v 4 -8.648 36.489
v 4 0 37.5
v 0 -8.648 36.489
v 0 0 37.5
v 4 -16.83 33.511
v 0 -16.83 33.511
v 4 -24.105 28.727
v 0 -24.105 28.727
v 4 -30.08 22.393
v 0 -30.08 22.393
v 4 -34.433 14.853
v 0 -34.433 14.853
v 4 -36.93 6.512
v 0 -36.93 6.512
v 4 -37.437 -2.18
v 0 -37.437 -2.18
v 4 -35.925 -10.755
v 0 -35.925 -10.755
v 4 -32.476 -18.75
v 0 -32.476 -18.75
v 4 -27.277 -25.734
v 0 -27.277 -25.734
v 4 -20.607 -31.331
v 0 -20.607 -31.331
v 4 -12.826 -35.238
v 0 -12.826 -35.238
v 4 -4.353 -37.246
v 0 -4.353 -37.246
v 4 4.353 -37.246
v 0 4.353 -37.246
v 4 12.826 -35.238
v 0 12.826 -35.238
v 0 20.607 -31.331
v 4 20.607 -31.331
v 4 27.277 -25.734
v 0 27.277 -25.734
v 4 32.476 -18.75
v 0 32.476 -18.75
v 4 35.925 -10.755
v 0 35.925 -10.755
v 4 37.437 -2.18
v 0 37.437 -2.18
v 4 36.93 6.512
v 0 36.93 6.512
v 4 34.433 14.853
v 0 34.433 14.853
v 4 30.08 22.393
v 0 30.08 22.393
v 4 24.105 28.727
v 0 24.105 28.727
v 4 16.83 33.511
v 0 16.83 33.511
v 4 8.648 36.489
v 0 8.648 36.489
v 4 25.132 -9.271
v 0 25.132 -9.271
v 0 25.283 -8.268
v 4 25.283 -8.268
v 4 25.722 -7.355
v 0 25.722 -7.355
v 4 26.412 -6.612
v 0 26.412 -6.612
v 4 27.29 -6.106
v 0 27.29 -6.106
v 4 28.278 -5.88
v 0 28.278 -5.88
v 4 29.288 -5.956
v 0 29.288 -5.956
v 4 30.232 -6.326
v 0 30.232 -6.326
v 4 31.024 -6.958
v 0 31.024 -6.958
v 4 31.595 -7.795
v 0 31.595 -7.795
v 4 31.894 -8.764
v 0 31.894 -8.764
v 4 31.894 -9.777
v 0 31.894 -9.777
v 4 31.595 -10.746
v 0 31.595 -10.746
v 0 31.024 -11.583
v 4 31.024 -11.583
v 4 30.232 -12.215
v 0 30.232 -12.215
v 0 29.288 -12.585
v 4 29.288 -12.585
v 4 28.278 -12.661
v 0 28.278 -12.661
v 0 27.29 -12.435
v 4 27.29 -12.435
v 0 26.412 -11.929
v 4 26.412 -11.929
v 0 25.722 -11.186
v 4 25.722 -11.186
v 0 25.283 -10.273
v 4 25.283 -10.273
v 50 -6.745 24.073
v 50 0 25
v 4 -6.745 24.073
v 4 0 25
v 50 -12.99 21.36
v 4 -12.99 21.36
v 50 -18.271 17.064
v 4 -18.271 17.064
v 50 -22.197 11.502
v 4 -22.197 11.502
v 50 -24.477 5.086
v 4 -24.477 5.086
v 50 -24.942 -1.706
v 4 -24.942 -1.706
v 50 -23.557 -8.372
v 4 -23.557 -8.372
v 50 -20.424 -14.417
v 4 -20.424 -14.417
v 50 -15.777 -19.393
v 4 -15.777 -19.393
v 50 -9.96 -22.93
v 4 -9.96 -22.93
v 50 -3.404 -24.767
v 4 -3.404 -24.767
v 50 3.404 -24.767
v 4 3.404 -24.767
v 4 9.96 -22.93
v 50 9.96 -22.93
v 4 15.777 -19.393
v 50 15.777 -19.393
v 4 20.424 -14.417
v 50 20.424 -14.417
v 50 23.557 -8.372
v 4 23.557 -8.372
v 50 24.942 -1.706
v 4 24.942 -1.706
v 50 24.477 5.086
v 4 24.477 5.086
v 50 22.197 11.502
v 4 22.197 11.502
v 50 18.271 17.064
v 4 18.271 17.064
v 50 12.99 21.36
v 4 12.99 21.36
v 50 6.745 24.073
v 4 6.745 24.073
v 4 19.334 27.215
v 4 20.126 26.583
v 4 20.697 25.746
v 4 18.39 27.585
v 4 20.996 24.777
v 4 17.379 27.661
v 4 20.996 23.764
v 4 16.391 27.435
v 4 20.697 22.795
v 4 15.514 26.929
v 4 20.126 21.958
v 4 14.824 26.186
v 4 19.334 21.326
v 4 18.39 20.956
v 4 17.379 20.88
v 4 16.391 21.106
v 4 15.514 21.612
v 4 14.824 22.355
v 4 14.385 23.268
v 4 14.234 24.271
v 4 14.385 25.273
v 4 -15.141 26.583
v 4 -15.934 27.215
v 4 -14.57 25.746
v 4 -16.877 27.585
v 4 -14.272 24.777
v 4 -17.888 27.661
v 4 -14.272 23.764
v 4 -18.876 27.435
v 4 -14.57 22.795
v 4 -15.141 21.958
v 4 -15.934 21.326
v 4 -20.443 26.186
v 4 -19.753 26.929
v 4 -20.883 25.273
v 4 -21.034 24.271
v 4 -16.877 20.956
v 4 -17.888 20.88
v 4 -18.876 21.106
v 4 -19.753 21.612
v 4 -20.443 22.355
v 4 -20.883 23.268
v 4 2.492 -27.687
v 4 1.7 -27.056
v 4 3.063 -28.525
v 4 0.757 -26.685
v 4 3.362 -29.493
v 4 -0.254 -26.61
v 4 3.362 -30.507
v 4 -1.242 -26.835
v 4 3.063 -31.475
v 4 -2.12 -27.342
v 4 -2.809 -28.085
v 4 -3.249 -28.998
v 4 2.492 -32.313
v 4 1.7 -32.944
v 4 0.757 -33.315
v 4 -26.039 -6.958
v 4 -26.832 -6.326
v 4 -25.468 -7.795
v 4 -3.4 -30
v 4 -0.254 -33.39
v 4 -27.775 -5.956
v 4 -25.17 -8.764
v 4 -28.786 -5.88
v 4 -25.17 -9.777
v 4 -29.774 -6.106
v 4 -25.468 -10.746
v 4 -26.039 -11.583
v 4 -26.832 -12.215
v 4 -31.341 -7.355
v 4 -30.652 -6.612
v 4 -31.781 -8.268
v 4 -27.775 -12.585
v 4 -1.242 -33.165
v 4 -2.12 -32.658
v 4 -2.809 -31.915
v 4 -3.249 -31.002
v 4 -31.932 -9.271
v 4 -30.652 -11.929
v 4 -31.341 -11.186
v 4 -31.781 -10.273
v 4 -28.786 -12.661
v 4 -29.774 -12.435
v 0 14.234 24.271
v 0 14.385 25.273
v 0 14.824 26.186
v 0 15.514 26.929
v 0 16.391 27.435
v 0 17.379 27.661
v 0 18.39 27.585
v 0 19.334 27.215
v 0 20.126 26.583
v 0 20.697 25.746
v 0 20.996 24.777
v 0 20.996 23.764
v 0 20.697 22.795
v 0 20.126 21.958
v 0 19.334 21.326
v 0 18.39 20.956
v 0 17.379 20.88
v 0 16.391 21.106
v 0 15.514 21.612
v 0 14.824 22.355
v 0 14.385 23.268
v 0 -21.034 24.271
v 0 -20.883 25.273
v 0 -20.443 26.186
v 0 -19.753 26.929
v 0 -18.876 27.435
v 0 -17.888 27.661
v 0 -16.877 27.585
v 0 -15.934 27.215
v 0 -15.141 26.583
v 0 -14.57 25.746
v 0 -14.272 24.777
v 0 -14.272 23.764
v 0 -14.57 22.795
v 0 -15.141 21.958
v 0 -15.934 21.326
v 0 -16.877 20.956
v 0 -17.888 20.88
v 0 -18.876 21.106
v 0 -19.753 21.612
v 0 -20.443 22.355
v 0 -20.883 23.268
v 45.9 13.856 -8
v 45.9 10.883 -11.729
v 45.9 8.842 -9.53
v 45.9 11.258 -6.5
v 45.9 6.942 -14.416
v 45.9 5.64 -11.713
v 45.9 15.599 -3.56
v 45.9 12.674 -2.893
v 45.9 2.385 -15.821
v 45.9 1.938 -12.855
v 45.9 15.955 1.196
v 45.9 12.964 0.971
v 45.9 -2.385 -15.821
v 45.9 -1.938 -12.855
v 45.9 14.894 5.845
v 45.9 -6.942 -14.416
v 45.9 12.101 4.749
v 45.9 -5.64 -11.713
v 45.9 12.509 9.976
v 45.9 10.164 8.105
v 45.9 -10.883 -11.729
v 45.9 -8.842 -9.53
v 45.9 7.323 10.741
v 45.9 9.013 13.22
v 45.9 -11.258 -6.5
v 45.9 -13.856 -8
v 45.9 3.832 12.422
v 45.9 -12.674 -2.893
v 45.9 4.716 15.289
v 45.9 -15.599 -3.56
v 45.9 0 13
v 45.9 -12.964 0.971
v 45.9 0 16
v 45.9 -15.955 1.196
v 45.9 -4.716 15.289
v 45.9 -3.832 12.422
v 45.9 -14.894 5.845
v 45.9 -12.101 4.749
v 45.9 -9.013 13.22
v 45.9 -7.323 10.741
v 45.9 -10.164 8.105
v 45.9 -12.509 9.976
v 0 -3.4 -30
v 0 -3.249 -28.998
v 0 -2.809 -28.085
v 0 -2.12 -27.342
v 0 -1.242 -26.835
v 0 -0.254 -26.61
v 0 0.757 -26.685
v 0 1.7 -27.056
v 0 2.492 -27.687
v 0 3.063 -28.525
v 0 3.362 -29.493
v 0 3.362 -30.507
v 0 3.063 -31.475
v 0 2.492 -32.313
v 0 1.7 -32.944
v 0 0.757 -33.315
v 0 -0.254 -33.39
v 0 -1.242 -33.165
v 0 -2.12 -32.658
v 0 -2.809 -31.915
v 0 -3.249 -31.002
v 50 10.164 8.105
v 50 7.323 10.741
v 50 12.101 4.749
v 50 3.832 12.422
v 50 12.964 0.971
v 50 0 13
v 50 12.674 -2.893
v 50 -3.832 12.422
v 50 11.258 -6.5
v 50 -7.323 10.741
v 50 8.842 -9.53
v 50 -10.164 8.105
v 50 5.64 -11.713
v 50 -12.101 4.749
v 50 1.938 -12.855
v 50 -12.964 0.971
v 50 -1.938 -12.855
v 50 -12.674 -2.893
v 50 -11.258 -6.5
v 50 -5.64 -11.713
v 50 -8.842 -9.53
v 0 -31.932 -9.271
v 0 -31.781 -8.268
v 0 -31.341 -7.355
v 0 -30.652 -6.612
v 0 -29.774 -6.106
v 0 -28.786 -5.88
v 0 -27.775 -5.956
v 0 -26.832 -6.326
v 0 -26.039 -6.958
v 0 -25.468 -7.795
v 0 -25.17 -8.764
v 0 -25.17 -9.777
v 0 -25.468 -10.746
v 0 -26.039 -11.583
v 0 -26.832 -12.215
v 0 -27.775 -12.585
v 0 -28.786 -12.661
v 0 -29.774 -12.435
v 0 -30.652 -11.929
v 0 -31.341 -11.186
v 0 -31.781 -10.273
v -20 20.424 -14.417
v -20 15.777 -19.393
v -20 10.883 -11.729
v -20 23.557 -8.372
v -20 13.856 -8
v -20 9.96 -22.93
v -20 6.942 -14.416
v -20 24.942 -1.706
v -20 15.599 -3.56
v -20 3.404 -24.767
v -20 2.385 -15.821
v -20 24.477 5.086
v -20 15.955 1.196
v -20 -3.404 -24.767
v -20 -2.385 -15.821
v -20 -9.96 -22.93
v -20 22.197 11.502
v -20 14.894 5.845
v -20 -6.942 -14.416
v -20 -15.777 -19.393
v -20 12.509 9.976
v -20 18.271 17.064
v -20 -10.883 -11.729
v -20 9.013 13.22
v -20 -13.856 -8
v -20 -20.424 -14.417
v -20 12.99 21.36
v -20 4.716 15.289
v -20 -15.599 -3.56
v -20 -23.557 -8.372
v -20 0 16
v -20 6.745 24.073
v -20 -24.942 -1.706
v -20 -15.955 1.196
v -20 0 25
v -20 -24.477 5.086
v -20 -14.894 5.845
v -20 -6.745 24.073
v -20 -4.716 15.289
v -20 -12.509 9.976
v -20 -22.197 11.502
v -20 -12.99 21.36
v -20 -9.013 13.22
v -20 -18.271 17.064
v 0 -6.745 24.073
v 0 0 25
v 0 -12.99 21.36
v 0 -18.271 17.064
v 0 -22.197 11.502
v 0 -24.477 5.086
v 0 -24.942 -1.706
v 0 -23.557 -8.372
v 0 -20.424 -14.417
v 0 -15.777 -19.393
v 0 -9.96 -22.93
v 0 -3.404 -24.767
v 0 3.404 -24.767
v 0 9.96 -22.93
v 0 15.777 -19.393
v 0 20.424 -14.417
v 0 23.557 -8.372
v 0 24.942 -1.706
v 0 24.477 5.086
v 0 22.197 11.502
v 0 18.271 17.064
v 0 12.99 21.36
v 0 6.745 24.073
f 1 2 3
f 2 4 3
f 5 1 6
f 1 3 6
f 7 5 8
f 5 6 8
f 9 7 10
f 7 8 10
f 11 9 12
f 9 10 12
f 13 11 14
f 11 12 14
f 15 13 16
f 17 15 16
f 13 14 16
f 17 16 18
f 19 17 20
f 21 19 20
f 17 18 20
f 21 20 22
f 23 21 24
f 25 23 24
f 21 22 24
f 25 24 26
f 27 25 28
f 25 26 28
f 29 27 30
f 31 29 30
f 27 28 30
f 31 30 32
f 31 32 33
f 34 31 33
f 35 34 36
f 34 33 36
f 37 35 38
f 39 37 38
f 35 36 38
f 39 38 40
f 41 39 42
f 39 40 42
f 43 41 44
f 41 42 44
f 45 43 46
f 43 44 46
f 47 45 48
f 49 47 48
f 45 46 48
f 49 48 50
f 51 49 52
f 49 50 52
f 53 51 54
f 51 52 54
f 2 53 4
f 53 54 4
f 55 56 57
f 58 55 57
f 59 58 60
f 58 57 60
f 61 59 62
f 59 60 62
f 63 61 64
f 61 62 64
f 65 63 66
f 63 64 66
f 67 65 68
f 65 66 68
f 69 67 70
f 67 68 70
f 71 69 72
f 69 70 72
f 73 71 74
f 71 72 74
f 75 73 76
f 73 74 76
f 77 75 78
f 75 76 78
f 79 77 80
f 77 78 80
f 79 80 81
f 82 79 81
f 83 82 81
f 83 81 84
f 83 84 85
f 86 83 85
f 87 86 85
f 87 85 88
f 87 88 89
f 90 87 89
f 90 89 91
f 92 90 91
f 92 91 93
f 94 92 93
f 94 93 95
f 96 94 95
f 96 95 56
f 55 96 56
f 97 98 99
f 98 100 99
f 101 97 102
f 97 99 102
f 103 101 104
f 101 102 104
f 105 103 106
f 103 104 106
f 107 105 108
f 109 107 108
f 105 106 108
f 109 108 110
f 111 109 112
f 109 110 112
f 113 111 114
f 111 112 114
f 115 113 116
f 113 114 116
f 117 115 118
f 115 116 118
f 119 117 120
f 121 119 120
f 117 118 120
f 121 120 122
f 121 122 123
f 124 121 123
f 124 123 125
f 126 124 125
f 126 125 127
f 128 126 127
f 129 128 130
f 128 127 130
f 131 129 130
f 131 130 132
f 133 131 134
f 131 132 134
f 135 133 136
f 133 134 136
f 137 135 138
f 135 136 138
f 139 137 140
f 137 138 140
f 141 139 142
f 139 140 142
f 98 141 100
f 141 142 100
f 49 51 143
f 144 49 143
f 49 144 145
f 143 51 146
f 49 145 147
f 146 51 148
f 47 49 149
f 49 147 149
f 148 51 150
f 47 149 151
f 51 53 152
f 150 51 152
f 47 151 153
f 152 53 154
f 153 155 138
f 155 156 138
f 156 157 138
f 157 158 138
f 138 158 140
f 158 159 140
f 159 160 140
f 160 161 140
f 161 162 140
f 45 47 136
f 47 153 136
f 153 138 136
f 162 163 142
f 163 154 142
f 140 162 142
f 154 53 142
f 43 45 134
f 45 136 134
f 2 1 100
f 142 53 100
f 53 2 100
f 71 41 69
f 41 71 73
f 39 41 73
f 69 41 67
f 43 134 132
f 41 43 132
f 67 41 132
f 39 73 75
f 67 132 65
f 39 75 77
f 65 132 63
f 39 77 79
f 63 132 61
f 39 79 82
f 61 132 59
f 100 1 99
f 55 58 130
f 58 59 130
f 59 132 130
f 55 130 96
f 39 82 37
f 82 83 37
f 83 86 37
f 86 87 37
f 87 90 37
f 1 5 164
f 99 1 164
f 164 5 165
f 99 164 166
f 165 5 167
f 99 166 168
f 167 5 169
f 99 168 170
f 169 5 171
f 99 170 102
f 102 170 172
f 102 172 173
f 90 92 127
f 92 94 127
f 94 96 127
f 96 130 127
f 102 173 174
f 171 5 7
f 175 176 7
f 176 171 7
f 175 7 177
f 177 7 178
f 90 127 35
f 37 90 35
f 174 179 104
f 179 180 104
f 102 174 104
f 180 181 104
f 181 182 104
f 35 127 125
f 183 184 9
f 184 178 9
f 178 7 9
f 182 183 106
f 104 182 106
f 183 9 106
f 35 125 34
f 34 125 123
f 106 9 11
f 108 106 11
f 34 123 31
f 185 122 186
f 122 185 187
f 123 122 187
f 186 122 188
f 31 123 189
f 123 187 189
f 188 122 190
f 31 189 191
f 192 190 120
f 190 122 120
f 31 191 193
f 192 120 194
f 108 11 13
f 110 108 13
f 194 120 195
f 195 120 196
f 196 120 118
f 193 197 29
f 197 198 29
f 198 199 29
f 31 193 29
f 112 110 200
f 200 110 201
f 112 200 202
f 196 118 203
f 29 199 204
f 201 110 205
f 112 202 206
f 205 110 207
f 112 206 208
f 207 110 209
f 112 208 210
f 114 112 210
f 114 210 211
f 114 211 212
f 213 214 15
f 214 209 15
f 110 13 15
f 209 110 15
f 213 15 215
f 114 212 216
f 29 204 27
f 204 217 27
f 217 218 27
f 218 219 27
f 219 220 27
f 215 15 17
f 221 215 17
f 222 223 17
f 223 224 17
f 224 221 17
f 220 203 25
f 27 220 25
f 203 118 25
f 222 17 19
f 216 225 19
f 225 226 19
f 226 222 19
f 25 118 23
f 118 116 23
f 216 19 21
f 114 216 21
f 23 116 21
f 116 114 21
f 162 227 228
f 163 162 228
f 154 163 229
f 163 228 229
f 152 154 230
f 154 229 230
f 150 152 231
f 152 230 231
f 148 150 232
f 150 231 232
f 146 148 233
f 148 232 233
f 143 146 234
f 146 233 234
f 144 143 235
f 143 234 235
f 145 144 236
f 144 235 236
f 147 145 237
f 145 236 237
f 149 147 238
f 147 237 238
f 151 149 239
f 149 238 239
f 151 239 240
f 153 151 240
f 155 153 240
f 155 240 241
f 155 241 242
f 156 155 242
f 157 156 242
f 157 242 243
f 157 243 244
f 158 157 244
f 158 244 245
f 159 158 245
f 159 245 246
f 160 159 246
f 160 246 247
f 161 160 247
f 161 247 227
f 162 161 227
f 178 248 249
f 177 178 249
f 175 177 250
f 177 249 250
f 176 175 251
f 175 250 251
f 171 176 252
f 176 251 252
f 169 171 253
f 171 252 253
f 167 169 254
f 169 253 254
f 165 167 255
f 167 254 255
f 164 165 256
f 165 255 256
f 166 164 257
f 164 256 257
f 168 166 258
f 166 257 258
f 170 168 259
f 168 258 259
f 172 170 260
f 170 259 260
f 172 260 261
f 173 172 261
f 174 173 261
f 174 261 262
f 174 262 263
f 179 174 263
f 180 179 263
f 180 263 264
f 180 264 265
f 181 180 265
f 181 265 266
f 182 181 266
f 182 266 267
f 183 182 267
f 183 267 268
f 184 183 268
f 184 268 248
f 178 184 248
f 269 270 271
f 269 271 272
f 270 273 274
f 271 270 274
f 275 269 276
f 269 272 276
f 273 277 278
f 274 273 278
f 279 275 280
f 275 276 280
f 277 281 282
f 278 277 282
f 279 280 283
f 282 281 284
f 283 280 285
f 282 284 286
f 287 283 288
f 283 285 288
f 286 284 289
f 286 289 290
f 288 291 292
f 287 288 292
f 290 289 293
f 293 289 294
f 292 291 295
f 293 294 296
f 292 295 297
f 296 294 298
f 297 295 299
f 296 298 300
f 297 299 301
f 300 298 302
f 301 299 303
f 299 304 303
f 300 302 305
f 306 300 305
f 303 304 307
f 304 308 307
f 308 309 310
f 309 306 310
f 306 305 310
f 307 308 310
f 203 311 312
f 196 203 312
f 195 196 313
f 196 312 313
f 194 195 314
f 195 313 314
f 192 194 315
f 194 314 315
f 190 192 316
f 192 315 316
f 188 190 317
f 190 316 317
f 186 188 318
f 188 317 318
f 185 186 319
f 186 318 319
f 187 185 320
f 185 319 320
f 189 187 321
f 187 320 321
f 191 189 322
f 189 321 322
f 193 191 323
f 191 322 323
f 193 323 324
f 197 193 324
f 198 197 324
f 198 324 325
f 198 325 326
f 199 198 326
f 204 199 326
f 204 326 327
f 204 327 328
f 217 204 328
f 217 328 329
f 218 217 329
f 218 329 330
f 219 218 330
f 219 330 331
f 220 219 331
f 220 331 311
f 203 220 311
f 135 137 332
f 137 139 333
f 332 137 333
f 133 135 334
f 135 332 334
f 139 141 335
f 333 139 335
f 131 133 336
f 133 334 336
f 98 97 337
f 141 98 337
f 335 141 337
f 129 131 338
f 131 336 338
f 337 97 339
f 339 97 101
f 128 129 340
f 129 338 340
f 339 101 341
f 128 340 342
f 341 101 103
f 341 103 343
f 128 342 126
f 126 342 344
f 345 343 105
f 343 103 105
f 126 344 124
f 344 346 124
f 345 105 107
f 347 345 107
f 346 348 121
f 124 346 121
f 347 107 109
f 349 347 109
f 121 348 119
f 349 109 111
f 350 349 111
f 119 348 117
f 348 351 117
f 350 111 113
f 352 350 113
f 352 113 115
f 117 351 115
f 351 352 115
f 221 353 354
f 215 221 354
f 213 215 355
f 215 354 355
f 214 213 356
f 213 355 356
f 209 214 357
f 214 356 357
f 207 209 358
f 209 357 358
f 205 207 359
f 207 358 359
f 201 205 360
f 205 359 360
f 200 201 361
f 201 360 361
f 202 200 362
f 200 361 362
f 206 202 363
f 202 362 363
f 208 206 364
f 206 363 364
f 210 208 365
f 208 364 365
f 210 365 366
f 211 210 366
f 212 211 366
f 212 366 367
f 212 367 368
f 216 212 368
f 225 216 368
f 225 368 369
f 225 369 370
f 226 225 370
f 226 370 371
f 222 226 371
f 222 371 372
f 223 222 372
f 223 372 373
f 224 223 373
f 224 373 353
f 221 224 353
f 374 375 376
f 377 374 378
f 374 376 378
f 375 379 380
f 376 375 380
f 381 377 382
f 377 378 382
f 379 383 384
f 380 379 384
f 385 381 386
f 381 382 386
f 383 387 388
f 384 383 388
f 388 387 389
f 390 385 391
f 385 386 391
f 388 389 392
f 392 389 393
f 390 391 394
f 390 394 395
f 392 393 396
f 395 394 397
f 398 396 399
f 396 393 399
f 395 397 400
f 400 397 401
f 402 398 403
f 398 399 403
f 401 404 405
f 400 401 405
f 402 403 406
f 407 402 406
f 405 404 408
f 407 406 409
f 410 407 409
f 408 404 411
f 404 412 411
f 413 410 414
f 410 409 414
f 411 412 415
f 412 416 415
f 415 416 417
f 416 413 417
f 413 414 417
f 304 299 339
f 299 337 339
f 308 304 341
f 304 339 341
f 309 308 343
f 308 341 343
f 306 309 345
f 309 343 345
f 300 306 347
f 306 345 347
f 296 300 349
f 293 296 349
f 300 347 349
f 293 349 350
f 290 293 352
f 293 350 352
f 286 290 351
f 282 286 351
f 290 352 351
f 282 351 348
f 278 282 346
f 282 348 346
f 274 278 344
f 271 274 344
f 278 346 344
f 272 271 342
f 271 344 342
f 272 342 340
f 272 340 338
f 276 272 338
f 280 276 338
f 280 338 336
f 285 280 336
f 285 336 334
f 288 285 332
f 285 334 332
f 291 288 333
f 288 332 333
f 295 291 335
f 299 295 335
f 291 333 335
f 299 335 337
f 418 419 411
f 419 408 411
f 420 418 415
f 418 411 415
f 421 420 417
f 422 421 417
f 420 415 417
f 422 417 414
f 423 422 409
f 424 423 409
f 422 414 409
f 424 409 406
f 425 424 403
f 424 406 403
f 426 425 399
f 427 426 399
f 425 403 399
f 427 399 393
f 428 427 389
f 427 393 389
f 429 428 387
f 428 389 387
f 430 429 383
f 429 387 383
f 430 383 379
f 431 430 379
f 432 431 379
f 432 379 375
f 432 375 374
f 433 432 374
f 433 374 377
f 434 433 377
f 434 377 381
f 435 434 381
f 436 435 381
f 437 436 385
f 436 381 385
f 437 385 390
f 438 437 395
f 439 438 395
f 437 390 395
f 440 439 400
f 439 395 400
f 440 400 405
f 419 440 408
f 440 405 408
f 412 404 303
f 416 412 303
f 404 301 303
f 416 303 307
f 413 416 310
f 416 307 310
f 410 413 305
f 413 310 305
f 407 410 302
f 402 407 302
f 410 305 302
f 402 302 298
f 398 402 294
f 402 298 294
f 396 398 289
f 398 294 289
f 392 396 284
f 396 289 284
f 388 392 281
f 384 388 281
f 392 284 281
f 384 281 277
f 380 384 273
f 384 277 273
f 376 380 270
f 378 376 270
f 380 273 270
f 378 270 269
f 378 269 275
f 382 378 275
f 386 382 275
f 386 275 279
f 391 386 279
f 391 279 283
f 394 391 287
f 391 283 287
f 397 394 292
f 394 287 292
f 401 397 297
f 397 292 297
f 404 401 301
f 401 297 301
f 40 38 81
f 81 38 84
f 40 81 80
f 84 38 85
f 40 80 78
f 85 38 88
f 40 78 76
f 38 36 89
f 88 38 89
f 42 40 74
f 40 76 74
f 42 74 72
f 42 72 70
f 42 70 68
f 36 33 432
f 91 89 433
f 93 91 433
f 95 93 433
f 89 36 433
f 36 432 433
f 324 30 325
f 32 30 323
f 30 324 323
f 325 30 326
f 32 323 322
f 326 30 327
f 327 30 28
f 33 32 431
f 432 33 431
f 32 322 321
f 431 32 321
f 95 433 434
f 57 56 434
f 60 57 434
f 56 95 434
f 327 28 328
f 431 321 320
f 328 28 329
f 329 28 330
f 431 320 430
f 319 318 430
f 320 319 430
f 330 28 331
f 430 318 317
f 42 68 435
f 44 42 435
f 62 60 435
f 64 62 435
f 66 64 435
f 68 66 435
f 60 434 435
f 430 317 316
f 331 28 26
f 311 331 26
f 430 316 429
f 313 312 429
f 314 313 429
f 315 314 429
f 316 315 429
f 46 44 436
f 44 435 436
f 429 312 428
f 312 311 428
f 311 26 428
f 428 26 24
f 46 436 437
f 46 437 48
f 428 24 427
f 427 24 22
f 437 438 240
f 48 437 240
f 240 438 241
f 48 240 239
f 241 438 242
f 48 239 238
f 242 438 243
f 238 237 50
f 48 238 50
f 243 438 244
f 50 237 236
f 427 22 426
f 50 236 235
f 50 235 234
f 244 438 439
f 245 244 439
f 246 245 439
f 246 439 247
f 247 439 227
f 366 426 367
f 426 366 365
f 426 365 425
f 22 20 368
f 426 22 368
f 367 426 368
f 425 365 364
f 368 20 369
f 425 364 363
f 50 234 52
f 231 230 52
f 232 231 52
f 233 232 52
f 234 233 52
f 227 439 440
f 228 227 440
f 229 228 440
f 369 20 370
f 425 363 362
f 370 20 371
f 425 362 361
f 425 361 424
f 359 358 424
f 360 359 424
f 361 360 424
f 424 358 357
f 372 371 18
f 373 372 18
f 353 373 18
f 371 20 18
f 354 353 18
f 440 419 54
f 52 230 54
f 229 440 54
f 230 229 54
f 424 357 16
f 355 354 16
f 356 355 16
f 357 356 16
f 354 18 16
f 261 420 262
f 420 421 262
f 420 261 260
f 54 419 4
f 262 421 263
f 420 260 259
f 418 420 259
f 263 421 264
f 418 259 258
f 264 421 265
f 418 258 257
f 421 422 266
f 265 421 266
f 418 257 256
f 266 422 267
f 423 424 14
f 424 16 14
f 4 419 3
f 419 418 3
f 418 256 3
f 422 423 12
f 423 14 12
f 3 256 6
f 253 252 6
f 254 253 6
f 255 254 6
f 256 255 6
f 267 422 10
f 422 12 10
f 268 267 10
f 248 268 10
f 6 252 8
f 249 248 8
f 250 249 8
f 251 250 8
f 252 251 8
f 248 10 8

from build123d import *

# Parameters (mm, degrees)
F3_D     = 6.8
F3_DEPTH = 48.75
F3_TIP   = 2.0429261047


with BuildPart() as f1:
    # F0 (on Front) → F1 (revolve)
    with BuildSketch(Plane.XZ):
        Polygon((4, 37.5), (0, 37.5), (0, 25), (-20, 25), (-20, 16), (45.9, 16), (45.9, 13), (50, 13), (50, 25), (4, 25), align=None)
    revolve(axis=Axis((40.2727089822, 0, 0), (1, 0, 0)))

    # F3
    with Locations(Plane.YZ.offset(4)):
        with Locations((0, -30), (-28.5316954889, -9.2705098312), (17.6335575688, 24.2705098312), (-17.6335575688, 24.2705098312), (28.5316954889, -9.2705098312)):
            Hole(F3_D / 2, depth=F3_DEPTH)
            with Locations((0, 0, -(F3_DEPTH + F3_TIP / 2))):  # 118° drill point
                Cone(0, F3_D / 2, F3_TIP, mode=Mode.SUBTRACT)


solid = f1.part
